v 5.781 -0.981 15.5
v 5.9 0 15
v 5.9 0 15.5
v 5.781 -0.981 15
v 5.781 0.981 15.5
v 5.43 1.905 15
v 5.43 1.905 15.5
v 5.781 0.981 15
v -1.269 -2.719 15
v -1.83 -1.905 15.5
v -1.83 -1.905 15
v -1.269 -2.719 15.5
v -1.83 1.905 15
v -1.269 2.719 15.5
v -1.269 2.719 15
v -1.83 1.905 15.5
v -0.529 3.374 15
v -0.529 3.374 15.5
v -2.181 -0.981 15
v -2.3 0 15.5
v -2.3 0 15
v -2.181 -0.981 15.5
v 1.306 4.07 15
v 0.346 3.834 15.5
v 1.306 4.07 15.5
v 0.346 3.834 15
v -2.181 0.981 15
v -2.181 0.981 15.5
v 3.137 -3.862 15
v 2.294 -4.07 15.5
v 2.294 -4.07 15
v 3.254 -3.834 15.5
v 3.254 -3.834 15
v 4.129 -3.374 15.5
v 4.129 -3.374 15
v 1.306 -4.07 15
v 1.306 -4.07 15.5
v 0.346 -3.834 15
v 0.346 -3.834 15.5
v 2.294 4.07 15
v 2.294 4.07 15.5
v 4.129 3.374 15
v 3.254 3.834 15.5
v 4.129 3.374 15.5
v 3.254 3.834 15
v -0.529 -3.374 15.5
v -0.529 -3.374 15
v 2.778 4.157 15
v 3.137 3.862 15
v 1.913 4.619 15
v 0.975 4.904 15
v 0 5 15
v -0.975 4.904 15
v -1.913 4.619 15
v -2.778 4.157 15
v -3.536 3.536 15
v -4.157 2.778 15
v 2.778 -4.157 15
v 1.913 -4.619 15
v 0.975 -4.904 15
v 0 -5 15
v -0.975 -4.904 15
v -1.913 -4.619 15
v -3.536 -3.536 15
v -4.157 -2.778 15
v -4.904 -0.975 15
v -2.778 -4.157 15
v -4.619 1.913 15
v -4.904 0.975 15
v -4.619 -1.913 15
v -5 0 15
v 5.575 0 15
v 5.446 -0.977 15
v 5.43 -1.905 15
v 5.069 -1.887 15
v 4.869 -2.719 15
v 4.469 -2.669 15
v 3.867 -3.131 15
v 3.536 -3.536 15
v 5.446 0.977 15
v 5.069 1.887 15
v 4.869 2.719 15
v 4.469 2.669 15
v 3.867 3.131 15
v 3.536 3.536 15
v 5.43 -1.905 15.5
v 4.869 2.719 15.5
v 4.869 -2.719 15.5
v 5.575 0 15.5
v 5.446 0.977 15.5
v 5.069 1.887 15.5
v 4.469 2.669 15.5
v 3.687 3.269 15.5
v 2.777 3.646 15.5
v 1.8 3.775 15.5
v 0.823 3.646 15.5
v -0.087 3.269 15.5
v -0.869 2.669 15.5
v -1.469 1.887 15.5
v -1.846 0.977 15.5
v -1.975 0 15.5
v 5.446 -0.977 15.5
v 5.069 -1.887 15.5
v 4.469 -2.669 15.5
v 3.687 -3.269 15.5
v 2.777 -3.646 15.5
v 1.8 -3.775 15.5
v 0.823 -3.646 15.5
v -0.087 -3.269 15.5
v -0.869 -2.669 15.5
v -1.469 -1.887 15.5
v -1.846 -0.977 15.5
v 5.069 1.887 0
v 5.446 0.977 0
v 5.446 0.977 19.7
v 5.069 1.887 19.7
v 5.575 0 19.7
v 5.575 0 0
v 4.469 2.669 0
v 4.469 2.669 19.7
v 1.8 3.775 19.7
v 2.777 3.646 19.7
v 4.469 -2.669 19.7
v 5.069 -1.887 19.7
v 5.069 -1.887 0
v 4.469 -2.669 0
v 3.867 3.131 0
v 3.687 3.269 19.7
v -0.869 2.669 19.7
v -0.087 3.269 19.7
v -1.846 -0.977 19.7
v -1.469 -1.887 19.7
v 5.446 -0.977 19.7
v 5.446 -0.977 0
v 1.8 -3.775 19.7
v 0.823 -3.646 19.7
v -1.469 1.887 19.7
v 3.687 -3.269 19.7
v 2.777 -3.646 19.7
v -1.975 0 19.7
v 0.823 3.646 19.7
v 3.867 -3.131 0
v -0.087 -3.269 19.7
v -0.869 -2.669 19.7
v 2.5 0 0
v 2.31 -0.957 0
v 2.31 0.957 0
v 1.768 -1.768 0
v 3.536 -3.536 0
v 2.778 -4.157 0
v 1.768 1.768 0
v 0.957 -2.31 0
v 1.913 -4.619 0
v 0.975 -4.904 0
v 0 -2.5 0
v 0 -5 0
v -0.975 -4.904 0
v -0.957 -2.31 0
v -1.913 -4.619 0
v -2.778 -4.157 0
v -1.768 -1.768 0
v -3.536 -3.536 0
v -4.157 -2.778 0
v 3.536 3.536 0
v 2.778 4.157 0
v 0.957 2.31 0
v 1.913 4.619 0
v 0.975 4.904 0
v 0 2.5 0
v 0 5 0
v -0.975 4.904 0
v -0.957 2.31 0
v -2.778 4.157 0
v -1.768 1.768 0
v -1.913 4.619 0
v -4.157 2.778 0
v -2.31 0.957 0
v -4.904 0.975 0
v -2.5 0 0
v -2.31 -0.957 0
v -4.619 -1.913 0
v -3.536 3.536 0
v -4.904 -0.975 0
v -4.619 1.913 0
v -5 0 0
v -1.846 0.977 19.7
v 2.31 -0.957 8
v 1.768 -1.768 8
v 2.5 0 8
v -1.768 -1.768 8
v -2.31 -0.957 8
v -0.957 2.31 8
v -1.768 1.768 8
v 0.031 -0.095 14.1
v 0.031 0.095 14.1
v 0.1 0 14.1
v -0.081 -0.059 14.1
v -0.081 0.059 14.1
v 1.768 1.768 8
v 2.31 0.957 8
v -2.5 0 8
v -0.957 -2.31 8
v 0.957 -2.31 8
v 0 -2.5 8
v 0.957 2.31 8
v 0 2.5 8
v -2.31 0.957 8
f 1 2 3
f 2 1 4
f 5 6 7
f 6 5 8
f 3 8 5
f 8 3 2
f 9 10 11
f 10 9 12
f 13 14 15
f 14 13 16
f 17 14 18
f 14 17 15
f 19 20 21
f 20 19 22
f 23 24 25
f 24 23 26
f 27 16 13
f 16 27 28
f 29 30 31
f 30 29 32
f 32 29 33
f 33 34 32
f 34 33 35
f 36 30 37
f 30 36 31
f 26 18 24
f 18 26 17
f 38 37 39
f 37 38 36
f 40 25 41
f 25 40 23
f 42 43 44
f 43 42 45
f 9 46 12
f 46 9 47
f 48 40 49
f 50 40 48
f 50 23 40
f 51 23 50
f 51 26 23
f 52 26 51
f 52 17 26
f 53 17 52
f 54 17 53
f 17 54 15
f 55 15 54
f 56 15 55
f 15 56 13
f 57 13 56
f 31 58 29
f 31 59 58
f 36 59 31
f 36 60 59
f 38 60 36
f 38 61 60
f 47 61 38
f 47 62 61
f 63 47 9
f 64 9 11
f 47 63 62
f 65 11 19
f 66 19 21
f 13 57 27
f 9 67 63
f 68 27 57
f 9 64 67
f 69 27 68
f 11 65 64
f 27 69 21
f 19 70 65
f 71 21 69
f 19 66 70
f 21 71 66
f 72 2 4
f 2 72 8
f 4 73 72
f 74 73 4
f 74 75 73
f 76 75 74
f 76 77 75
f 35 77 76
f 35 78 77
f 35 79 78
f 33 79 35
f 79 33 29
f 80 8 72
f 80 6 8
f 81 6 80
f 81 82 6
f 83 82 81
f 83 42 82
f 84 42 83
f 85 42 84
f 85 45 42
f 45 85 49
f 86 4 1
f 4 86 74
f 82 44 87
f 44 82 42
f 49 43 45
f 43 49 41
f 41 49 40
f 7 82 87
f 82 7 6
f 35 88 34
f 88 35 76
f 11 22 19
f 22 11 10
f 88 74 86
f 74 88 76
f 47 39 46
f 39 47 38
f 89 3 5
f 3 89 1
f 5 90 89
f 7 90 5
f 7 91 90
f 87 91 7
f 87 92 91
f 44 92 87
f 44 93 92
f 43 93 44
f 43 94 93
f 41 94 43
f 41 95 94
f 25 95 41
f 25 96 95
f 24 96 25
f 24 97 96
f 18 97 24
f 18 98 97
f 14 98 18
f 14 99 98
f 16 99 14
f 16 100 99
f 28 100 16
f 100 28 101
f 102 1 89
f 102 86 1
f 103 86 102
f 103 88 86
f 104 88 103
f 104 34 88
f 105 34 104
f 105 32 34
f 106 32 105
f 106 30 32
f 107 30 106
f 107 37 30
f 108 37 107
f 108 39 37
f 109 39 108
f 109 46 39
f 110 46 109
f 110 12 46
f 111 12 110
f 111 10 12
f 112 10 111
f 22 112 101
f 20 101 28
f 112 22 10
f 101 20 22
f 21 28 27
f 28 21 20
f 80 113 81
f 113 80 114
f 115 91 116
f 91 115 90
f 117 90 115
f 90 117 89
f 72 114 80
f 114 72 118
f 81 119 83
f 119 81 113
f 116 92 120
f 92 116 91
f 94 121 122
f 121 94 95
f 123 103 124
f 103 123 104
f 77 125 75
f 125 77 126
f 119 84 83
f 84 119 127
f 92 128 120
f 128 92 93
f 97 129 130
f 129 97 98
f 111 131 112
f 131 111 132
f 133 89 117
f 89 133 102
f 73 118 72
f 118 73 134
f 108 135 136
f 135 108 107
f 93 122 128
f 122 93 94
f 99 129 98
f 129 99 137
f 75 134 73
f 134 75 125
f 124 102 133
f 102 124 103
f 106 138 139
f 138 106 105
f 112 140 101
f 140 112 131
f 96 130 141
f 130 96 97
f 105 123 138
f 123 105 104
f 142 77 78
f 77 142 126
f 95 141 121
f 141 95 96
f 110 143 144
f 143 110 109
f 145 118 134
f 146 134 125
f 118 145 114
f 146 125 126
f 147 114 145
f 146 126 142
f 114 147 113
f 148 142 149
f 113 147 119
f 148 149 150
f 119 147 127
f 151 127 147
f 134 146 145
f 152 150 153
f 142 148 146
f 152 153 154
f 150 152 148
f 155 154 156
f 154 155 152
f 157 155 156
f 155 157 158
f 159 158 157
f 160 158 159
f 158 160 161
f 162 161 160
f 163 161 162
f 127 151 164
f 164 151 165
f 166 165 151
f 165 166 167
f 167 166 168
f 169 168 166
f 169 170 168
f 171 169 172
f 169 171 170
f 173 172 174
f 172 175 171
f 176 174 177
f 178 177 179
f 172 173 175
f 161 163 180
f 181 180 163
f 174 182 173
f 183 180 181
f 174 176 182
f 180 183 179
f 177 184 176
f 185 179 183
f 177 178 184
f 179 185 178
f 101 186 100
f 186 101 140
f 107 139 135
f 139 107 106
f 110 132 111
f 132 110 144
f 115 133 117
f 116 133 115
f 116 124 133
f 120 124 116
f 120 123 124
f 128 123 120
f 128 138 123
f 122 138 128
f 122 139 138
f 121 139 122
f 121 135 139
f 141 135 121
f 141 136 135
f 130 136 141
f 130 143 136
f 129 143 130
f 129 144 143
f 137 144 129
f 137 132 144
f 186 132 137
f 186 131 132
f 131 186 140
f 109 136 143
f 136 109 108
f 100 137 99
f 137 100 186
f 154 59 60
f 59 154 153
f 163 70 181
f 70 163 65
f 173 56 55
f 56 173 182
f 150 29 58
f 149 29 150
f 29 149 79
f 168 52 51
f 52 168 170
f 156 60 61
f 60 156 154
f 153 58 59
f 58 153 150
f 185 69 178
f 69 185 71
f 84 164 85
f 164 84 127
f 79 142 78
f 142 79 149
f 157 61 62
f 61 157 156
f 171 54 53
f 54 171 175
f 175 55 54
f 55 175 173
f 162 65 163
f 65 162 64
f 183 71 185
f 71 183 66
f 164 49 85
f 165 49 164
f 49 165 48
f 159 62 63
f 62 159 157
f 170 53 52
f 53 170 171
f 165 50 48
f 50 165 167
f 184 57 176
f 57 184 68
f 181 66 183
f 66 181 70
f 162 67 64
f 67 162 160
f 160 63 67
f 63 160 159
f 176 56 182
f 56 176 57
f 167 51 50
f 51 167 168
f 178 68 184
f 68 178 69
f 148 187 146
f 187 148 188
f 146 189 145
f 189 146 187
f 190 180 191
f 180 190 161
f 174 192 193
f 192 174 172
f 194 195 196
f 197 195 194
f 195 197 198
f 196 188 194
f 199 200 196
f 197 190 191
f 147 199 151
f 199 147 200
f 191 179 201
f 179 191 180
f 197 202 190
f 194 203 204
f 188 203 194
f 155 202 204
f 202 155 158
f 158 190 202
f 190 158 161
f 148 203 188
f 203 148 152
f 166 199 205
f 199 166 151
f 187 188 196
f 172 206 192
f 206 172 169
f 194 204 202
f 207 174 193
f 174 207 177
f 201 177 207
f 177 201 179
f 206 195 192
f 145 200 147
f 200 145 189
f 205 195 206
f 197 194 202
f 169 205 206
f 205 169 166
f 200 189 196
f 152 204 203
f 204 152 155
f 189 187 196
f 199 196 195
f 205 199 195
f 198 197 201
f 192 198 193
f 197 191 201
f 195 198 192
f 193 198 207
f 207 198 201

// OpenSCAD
// file: param.scad
$fa = 5; //5  minimum=0.01
$fs = 1; //0.1  minimum=0.01

/////base params
R = 24;
r = 3;
l = 1.8; //eccentric shaft dist

/////roter
ecce = 1.8;
d_ecceshaft = 7.6;
l_eccesleeve_h = 0.5;
l_roter_thick = 3.5;
d_eccebearing = 14;
d_eccebearing_fr = 16.5;
l_eccebearing_h = 4;
l_eccebearing_fr = 0.8;

tr_bearing_shaft = +0.2;
tr_bearing_hole = -0.2;

//outpin
th_outp_angle = 22.5;
d_outp_position = 30;
d_outp_diameter = 5;

l_outp_step_h = 0.5;
l_outp_length = 2.9;

/////motor shaft
d_motshaft = 5;
l_motshaft = 8;//13;
l_motshafthld = l_motshaft+7;
l_motecceshaft = l_motshaft+11.7;

d_shaftholder = 10;


/////outer-pole
d_pole = 6;
l_pole = 5.5;
d_pole_hole = 3.5;

d_pole_position = (R+r)*2;
ROTER2OUTERPIN_GAP = 0.15;


/////bottom-plate
l_bottomplate_h = 4;

/////lid-plate
l_lidspacer_h = 2;

/////output-roter
d_output_hole = (d_outp_diameter/2 + l)*2;
l_output_h = 2.5;
l_output_shaft_fr = 0.5;
l_output_shaft_len = 15;
// main file
include <param.scad>

module shaft_hole(){
    hull(){
        translate([0,0,l_motshaft+6])
        cylinder(h=0.1,r=0.1);
        cylinder(h=l_motshaft,r=d_motshaft/2);
    }
}

module eccentric_shaft(){
    
    GAP = 0.025;
    
    translate([ecce,0,0]){
        
        translate([0,0,l_motshafthld])
        cylinder(h=l_eccesleeve_h,r=d_ecceshaft/2+0.3);
        cylinder(h=l_motecceshaft,r=d_ecceshaft/2-GAP);
    }
}

module shaft_holder(){
    union(){
        //shaft holder
        cylinder(h=l_motshafthld,r=d_shaftholder/2,center=false);
        
        eccentric_shaft();
    }
}

difference(){
    shaft_holder();
    shaft_hole();
}
